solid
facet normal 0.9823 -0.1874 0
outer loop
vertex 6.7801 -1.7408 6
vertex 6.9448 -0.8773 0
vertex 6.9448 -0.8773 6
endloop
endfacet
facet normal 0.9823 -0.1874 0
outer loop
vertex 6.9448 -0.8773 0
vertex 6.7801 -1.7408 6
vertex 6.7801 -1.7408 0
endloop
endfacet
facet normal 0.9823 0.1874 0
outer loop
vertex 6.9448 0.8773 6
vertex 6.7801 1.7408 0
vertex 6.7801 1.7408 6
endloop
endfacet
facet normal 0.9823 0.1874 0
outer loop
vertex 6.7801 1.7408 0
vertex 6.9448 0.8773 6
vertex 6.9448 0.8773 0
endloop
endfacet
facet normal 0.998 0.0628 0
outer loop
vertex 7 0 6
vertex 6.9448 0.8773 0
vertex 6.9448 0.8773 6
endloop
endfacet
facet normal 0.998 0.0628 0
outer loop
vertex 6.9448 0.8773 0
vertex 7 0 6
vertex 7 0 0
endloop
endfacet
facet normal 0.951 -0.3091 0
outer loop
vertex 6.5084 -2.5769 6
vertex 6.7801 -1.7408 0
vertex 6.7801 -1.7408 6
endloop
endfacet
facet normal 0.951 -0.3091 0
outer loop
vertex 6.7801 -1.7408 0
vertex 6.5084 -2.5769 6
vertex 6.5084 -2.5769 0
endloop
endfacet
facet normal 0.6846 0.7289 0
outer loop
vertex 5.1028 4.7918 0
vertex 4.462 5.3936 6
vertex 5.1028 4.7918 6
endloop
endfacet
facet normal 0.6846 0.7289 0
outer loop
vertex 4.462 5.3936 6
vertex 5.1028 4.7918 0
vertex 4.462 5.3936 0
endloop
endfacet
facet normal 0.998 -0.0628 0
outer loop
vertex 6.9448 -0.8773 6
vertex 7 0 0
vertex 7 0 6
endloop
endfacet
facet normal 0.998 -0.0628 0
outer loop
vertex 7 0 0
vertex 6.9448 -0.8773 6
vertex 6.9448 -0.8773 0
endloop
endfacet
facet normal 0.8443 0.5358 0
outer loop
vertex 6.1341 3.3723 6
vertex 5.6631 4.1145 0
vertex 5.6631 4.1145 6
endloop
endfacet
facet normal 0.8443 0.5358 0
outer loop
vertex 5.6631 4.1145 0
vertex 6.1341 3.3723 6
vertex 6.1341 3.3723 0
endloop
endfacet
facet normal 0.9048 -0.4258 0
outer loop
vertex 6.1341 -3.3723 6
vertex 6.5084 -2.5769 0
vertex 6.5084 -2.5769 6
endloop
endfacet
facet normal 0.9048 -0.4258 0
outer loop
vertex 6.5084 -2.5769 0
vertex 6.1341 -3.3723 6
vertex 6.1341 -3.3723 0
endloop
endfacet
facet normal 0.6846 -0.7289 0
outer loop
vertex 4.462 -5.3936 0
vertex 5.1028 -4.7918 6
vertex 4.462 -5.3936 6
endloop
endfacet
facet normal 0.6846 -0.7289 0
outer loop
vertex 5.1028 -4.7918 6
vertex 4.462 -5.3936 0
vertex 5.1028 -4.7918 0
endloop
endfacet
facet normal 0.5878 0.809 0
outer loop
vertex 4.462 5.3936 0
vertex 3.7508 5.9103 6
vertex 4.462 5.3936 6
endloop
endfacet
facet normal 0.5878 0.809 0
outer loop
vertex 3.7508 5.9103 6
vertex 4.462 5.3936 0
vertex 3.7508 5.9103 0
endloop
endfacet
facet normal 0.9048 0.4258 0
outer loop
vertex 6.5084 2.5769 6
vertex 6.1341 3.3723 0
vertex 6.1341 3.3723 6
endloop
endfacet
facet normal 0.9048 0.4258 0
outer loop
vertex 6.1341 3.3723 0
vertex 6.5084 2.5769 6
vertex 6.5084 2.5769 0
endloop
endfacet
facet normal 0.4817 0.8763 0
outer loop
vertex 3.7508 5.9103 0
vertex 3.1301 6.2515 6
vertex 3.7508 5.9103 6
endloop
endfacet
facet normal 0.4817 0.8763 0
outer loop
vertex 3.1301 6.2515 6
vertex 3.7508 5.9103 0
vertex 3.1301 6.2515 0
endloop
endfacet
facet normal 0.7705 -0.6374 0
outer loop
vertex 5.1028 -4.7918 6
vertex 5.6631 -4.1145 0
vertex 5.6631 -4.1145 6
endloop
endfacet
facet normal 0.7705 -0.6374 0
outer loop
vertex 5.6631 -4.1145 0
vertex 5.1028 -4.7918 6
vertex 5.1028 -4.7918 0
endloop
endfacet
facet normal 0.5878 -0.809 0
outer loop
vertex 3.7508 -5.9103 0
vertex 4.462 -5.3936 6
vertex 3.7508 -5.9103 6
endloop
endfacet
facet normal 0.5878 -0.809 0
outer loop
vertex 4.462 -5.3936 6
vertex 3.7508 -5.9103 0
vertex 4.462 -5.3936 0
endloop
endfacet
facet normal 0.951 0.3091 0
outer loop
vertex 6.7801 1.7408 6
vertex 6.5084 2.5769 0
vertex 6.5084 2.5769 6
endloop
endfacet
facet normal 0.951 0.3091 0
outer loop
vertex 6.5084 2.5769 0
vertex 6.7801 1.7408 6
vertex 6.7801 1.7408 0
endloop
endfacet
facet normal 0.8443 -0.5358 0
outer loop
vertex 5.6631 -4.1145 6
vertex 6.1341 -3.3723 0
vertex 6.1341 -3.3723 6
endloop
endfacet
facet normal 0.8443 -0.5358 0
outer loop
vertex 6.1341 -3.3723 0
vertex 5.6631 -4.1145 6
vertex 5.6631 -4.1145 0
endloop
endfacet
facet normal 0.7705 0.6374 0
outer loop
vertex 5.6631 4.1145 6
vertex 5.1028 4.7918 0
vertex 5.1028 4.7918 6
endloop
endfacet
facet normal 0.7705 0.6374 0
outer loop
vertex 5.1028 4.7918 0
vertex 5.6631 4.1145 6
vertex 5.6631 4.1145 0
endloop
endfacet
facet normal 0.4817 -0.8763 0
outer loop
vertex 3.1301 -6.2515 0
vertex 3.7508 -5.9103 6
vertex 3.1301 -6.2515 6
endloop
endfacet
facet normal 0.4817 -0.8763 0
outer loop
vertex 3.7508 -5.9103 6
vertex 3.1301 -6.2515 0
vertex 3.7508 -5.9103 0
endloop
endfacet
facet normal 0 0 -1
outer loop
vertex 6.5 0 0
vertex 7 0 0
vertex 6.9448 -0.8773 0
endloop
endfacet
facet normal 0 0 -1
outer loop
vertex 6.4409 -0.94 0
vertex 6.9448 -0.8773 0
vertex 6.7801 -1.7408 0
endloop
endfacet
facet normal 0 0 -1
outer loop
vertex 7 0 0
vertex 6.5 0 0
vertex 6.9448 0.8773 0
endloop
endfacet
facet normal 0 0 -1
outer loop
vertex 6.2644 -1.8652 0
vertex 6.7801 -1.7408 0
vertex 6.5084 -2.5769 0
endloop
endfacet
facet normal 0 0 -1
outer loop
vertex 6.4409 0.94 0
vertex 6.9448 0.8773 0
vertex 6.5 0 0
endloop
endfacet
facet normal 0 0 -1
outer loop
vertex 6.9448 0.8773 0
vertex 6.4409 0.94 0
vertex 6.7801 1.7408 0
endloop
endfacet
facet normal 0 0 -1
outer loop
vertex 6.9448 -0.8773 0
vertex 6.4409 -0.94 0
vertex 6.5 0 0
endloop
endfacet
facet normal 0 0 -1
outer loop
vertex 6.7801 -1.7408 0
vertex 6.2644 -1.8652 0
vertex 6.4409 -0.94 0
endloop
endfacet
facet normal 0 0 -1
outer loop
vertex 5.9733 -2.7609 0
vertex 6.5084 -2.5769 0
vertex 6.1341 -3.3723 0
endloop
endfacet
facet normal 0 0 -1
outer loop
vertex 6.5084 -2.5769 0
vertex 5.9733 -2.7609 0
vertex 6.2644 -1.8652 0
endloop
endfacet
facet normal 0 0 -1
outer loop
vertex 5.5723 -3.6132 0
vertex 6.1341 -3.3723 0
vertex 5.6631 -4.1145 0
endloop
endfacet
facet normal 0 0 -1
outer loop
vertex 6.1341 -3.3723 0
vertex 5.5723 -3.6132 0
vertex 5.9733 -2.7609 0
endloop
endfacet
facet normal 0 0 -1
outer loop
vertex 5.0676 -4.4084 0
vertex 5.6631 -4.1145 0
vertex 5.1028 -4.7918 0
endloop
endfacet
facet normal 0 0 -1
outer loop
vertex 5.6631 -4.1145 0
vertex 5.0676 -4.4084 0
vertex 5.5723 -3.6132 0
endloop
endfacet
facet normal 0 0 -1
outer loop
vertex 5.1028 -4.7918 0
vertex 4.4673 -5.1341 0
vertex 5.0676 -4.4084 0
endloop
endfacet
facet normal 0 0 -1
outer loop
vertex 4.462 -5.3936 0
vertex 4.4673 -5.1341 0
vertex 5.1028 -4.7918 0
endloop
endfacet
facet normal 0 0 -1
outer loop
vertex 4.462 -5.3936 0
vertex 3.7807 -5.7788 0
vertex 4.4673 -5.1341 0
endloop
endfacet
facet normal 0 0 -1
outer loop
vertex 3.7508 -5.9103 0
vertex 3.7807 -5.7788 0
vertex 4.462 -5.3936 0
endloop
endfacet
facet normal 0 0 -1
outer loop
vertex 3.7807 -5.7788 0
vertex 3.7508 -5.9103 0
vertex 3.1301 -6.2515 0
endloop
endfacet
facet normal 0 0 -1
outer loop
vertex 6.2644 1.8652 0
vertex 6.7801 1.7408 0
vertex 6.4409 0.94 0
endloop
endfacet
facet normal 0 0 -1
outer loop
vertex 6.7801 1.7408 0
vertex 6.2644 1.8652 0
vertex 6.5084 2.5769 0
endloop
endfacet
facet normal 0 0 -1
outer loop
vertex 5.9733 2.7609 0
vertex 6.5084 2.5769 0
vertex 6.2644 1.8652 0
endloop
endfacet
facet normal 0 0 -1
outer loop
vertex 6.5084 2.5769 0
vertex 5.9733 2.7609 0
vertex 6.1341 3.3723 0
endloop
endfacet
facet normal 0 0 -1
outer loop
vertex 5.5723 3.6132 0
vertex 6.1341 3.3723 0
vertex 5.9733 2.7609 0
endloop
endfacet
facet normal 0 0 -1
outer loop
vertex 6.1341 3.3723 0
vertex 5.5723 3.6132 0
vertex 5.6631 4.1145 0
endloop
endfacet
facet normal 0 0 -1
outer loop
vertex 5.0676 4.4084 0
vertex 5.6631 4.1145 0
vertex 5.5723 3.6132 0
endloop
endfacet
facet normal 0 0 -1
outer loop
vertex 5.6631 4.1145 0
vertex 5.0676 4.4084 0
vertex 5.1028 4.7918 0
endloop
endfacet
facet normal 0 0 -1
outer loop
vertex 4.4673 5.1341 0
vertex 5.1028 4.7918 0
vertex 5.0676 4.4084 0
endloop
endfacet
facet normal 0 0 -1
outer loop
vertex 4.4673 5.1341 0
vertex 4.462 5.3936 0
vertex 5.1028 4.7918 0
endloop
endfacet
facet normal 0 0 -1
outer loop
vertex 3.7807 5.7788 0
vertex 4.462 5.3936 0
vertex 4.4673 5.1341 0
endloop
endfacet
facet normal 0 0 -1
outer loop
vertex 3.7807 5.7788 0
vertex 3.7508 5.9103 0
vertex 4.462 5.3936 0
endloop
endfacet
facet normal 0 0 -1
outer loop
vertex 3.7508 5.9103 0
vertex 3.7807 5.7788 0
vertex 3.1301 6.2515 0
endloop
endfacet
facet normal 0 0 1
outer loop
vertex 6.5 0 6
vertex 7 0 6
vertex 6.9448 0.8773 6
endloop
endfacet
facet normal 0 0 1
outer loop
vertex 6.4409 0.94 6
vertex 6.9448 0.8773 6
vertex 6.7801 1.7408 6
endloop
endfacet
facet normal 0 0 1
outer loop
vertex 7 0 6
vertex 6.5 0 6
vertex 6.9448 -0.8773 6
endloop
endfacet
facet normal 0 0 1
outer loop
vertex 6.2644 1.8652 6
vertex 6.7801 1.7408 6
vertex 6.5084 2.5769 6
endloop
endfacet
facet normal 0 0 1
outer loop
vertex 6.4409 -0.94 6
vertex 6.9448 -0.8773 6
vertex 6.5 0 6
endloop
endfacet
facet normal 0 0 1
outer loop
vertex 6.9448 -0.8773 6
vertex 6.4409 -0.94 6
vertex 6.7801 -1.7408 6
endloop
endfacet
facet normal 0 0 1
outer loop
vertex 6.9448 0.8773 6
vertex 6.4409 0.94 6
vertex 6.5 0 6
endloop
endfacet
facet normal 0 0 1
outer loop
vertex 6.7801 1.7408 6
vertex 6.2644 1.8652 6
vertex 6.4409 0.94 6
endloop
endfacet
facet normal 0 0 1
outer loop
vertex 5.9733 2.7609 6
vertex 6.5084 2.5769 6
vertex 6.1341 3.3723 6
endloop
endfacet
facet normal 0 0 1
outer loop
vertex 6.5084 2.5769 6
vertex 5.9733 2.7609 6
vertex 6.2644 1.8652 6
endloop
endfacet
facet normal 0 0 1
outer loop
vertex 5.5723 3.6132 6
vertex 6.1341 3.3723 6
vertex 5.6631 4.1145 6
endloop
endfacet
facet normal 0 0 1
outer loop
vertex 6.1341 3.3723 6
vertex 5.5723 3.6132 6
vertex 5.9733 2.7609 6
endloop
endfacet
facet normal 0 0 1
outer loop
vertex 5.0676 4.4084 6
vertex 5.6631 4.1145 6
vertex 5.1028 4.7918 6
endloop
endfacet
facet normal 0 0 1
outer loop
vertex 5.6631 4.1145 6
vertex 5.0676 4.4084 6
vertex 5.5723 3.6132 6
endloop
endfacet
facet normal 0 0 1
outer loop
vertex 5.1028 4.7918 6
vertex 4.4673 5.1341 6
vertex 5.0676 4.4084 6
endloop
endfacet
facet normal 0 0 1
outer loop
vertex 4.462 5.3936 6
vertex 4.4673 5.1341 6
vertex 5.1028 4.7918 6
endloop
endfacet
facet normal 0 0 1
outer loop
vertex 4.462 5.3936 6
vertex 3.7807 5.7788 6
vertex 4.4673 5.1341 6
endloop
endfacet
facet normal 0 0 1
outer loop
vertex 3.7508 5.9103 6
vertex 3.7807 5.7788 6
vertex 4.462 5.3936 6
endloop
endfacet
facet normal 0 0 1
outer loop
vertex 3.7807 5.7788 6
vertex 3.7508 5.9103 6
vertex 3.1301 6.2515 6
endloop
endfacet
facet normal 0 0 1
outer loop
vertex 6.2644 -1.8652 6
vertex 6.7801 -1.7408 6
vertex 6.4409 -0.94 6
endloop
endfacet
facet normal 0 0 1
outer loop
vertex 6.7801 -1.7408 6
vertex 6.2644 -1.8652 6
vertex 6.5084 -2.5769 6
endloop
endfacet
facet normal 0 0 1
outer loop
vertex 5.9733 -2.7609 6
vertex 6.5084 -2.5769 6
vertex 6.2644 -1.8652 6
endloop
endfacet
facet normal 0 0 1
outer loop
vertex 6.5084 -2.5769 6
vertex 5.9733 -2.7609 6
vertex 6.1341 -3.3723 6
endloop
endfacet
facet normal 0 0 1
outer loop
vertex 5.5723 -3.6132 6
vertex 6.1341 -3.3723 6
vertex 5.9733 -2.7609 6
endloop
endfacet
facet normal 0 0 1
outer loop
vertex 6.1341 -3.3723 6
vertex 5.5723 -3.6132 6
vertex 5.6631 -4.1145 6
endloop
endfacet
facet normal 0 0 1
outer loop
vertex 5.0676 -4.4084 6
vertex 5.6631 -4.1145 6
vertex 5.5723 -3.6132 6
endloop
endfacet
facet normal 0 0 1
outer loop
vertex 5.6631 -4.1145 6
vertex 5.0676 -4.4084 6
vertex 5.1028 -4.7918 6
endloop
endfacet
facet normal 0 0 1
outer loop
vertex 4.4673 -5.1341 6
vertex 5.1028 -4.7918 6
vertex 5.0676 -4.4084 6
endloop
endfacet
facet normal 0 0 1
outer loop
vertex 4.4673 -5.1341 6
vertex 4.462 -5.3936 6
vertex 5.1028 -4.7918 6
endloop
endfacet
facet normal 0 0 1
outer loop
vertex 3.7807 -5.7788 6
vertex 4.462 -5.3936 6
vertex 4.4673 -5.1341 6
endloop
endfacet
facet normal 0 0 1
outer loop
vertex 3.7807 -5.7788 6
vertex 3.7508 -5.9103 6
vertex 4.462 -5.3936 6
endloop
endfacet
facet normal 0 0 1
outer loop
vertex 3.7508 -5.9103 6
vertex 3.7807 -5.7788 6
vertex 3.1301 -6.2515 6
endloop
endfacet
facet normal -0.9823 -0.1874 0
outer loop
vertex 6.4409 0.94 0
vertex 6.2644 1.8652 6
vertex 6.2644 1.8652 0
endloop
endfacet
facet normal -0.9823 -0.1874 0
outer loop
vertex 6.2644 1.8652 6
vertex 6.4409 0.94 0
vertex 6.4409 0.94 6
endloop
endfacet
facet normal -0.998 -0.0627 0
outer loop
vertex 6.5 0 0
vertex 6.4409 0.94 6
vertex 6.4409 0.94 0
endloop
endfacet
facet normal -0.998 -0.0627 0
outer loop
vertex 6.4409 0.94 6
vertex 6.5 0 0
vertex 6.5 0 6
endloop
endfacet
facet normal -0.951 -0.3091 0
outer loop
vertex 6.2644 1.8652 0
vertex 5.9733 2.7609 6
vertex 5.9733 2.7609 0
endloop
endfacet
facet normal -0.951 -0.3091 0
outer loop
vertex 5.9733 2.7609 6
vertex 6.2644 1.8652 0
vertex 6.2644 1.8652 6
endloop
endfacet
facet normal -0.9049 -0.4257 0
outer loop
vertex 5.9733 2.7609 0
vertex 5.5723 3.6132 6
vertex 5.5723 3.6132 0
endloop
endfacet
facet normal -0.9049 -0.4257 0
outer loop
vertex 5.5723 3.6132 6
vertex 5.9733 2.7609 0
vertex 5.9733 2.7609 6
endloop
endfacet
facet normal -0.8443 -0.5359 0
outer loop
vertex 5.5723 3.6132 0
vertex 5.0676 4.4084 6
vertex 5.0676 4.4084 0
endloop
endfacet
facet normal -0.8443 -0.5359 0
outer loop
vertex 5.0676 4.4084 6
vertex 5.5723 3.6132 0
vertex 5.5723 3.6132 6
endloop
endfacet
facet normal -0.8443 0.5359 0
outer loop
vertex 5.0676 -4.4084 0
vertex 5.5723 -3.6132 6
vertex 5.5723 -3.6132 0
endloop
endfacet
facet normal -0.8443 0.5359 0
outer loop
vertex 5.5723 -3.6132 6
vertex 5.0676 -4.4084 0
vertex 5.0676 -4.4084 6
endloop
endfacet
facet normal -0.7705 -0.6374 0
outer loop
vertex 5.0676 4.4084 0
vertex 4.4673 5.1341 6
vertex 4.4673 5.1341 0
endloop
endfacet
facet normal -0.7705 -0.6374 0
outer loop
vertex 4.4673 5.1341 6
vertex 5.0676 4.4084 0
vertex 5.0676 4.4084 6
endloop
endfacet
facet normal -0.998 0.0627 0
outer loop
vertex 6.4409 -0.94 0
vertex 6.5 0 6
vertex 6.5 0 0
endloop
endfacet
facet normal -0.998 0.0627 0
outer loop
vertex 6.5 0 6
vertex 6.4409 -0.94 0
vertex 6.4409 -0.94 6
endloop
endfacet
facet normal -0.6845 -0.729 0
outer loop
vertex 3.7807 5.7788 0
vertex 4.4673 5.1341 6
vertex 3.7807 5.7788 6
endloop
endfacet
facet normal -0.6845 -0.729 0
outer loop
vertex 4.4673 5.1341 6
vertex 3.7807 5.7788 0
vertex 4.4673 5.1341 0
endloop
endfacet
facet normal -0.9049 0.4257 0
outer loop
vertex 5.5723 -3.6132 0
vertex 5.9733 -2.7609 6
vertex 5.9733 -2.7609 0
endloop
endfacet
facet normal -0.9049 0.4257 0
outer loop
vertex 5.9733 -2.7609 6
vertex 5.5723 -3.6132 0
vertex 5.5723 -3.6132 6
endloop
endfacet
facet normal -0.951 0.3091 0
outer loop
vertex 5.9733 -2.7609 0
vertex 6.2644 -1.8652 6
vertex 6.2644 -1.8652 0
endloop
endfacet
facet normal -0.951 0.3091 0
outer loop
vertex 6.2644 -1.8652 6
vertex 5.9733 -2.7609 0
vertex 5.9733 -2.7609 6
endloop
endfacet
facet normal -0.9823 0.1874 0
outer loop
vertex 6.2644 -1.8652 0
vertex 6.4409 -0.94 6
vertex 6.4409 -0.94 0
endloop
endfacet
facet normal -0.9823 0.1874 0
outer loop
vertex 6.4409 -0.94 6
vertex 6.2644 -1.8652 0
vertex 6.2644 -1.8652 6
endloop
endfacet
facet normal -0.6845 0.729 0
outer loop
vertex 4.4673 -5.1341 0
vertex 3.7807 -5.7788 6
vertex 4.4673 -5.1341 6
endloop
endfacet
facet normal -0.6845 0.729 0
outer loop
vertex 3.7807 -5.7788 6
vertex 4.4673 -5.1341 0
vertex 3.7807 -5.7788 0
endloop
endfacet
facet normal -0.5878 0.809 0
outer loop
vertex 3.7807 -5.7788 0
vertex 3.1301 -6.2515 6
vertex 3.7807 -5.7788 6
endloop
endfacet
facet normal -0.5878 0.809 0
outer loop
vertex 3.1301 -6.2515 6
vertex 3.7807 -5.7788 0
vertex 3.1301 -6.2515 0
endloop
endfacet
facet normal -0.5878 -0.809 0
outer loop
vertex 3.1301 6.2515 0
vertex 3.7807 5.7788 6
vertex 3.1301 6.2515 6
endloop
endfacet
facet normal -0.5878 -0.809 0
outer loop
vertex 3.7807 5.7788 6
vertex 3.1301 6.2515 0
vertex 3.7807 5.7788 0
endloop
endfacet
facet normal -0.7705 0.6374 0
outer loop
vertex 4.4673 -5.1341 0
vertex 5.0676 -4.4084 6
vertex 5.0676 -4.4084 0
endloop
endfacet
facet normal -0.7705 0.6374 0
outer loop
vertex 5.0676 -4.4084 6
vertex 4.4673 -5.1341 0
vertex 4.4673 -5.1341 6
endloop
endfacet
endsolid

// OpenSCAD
$fn = 50;


difference() {
	union() {
		cylinder(h = 6, r = 7.0000000000);
		translate(v = [-4.0000000000, 0, 0]) {
			cylinder(h = 6, r = 7.0000000000);
		}
	}
	union() {
		cylinder(h = 6, r = 3.2500000000);
		cylinder(h = 6, r = 1.8000000000);
		cylinder(h = 6, r = 1.8000000000);
		cylinder(h = 6, r = 1.8000000000);
		translate(v = [-8.5000000000, 0, 0]) {
			hull() {
				translate(v = [-3.7500000000, 0.0000000000, 0]) {
					cylinder(h = 6, r = 7.5000000000);
				}
				translate(v = [3.7500000000, 0.0000000000, 0]) {
					cylinder(h = 6, r = 7.5000000000);
				}
				translate(v = [-3.7500000000, -0.0000000000, 0]) {
					cylinder(h = 6, r = 7.5000000000);
				}
				translate(v = [3.7500000000, -0.0000000000, 0]) {
					cylinder(h = 6, r = 7.5000000000);
				}
			}
		}
		translate(v = [-1.0000000000, 0, 0.0000000000]) {
			cylinder(h = 6, r = 7.5000000000);
		}
	}
}
